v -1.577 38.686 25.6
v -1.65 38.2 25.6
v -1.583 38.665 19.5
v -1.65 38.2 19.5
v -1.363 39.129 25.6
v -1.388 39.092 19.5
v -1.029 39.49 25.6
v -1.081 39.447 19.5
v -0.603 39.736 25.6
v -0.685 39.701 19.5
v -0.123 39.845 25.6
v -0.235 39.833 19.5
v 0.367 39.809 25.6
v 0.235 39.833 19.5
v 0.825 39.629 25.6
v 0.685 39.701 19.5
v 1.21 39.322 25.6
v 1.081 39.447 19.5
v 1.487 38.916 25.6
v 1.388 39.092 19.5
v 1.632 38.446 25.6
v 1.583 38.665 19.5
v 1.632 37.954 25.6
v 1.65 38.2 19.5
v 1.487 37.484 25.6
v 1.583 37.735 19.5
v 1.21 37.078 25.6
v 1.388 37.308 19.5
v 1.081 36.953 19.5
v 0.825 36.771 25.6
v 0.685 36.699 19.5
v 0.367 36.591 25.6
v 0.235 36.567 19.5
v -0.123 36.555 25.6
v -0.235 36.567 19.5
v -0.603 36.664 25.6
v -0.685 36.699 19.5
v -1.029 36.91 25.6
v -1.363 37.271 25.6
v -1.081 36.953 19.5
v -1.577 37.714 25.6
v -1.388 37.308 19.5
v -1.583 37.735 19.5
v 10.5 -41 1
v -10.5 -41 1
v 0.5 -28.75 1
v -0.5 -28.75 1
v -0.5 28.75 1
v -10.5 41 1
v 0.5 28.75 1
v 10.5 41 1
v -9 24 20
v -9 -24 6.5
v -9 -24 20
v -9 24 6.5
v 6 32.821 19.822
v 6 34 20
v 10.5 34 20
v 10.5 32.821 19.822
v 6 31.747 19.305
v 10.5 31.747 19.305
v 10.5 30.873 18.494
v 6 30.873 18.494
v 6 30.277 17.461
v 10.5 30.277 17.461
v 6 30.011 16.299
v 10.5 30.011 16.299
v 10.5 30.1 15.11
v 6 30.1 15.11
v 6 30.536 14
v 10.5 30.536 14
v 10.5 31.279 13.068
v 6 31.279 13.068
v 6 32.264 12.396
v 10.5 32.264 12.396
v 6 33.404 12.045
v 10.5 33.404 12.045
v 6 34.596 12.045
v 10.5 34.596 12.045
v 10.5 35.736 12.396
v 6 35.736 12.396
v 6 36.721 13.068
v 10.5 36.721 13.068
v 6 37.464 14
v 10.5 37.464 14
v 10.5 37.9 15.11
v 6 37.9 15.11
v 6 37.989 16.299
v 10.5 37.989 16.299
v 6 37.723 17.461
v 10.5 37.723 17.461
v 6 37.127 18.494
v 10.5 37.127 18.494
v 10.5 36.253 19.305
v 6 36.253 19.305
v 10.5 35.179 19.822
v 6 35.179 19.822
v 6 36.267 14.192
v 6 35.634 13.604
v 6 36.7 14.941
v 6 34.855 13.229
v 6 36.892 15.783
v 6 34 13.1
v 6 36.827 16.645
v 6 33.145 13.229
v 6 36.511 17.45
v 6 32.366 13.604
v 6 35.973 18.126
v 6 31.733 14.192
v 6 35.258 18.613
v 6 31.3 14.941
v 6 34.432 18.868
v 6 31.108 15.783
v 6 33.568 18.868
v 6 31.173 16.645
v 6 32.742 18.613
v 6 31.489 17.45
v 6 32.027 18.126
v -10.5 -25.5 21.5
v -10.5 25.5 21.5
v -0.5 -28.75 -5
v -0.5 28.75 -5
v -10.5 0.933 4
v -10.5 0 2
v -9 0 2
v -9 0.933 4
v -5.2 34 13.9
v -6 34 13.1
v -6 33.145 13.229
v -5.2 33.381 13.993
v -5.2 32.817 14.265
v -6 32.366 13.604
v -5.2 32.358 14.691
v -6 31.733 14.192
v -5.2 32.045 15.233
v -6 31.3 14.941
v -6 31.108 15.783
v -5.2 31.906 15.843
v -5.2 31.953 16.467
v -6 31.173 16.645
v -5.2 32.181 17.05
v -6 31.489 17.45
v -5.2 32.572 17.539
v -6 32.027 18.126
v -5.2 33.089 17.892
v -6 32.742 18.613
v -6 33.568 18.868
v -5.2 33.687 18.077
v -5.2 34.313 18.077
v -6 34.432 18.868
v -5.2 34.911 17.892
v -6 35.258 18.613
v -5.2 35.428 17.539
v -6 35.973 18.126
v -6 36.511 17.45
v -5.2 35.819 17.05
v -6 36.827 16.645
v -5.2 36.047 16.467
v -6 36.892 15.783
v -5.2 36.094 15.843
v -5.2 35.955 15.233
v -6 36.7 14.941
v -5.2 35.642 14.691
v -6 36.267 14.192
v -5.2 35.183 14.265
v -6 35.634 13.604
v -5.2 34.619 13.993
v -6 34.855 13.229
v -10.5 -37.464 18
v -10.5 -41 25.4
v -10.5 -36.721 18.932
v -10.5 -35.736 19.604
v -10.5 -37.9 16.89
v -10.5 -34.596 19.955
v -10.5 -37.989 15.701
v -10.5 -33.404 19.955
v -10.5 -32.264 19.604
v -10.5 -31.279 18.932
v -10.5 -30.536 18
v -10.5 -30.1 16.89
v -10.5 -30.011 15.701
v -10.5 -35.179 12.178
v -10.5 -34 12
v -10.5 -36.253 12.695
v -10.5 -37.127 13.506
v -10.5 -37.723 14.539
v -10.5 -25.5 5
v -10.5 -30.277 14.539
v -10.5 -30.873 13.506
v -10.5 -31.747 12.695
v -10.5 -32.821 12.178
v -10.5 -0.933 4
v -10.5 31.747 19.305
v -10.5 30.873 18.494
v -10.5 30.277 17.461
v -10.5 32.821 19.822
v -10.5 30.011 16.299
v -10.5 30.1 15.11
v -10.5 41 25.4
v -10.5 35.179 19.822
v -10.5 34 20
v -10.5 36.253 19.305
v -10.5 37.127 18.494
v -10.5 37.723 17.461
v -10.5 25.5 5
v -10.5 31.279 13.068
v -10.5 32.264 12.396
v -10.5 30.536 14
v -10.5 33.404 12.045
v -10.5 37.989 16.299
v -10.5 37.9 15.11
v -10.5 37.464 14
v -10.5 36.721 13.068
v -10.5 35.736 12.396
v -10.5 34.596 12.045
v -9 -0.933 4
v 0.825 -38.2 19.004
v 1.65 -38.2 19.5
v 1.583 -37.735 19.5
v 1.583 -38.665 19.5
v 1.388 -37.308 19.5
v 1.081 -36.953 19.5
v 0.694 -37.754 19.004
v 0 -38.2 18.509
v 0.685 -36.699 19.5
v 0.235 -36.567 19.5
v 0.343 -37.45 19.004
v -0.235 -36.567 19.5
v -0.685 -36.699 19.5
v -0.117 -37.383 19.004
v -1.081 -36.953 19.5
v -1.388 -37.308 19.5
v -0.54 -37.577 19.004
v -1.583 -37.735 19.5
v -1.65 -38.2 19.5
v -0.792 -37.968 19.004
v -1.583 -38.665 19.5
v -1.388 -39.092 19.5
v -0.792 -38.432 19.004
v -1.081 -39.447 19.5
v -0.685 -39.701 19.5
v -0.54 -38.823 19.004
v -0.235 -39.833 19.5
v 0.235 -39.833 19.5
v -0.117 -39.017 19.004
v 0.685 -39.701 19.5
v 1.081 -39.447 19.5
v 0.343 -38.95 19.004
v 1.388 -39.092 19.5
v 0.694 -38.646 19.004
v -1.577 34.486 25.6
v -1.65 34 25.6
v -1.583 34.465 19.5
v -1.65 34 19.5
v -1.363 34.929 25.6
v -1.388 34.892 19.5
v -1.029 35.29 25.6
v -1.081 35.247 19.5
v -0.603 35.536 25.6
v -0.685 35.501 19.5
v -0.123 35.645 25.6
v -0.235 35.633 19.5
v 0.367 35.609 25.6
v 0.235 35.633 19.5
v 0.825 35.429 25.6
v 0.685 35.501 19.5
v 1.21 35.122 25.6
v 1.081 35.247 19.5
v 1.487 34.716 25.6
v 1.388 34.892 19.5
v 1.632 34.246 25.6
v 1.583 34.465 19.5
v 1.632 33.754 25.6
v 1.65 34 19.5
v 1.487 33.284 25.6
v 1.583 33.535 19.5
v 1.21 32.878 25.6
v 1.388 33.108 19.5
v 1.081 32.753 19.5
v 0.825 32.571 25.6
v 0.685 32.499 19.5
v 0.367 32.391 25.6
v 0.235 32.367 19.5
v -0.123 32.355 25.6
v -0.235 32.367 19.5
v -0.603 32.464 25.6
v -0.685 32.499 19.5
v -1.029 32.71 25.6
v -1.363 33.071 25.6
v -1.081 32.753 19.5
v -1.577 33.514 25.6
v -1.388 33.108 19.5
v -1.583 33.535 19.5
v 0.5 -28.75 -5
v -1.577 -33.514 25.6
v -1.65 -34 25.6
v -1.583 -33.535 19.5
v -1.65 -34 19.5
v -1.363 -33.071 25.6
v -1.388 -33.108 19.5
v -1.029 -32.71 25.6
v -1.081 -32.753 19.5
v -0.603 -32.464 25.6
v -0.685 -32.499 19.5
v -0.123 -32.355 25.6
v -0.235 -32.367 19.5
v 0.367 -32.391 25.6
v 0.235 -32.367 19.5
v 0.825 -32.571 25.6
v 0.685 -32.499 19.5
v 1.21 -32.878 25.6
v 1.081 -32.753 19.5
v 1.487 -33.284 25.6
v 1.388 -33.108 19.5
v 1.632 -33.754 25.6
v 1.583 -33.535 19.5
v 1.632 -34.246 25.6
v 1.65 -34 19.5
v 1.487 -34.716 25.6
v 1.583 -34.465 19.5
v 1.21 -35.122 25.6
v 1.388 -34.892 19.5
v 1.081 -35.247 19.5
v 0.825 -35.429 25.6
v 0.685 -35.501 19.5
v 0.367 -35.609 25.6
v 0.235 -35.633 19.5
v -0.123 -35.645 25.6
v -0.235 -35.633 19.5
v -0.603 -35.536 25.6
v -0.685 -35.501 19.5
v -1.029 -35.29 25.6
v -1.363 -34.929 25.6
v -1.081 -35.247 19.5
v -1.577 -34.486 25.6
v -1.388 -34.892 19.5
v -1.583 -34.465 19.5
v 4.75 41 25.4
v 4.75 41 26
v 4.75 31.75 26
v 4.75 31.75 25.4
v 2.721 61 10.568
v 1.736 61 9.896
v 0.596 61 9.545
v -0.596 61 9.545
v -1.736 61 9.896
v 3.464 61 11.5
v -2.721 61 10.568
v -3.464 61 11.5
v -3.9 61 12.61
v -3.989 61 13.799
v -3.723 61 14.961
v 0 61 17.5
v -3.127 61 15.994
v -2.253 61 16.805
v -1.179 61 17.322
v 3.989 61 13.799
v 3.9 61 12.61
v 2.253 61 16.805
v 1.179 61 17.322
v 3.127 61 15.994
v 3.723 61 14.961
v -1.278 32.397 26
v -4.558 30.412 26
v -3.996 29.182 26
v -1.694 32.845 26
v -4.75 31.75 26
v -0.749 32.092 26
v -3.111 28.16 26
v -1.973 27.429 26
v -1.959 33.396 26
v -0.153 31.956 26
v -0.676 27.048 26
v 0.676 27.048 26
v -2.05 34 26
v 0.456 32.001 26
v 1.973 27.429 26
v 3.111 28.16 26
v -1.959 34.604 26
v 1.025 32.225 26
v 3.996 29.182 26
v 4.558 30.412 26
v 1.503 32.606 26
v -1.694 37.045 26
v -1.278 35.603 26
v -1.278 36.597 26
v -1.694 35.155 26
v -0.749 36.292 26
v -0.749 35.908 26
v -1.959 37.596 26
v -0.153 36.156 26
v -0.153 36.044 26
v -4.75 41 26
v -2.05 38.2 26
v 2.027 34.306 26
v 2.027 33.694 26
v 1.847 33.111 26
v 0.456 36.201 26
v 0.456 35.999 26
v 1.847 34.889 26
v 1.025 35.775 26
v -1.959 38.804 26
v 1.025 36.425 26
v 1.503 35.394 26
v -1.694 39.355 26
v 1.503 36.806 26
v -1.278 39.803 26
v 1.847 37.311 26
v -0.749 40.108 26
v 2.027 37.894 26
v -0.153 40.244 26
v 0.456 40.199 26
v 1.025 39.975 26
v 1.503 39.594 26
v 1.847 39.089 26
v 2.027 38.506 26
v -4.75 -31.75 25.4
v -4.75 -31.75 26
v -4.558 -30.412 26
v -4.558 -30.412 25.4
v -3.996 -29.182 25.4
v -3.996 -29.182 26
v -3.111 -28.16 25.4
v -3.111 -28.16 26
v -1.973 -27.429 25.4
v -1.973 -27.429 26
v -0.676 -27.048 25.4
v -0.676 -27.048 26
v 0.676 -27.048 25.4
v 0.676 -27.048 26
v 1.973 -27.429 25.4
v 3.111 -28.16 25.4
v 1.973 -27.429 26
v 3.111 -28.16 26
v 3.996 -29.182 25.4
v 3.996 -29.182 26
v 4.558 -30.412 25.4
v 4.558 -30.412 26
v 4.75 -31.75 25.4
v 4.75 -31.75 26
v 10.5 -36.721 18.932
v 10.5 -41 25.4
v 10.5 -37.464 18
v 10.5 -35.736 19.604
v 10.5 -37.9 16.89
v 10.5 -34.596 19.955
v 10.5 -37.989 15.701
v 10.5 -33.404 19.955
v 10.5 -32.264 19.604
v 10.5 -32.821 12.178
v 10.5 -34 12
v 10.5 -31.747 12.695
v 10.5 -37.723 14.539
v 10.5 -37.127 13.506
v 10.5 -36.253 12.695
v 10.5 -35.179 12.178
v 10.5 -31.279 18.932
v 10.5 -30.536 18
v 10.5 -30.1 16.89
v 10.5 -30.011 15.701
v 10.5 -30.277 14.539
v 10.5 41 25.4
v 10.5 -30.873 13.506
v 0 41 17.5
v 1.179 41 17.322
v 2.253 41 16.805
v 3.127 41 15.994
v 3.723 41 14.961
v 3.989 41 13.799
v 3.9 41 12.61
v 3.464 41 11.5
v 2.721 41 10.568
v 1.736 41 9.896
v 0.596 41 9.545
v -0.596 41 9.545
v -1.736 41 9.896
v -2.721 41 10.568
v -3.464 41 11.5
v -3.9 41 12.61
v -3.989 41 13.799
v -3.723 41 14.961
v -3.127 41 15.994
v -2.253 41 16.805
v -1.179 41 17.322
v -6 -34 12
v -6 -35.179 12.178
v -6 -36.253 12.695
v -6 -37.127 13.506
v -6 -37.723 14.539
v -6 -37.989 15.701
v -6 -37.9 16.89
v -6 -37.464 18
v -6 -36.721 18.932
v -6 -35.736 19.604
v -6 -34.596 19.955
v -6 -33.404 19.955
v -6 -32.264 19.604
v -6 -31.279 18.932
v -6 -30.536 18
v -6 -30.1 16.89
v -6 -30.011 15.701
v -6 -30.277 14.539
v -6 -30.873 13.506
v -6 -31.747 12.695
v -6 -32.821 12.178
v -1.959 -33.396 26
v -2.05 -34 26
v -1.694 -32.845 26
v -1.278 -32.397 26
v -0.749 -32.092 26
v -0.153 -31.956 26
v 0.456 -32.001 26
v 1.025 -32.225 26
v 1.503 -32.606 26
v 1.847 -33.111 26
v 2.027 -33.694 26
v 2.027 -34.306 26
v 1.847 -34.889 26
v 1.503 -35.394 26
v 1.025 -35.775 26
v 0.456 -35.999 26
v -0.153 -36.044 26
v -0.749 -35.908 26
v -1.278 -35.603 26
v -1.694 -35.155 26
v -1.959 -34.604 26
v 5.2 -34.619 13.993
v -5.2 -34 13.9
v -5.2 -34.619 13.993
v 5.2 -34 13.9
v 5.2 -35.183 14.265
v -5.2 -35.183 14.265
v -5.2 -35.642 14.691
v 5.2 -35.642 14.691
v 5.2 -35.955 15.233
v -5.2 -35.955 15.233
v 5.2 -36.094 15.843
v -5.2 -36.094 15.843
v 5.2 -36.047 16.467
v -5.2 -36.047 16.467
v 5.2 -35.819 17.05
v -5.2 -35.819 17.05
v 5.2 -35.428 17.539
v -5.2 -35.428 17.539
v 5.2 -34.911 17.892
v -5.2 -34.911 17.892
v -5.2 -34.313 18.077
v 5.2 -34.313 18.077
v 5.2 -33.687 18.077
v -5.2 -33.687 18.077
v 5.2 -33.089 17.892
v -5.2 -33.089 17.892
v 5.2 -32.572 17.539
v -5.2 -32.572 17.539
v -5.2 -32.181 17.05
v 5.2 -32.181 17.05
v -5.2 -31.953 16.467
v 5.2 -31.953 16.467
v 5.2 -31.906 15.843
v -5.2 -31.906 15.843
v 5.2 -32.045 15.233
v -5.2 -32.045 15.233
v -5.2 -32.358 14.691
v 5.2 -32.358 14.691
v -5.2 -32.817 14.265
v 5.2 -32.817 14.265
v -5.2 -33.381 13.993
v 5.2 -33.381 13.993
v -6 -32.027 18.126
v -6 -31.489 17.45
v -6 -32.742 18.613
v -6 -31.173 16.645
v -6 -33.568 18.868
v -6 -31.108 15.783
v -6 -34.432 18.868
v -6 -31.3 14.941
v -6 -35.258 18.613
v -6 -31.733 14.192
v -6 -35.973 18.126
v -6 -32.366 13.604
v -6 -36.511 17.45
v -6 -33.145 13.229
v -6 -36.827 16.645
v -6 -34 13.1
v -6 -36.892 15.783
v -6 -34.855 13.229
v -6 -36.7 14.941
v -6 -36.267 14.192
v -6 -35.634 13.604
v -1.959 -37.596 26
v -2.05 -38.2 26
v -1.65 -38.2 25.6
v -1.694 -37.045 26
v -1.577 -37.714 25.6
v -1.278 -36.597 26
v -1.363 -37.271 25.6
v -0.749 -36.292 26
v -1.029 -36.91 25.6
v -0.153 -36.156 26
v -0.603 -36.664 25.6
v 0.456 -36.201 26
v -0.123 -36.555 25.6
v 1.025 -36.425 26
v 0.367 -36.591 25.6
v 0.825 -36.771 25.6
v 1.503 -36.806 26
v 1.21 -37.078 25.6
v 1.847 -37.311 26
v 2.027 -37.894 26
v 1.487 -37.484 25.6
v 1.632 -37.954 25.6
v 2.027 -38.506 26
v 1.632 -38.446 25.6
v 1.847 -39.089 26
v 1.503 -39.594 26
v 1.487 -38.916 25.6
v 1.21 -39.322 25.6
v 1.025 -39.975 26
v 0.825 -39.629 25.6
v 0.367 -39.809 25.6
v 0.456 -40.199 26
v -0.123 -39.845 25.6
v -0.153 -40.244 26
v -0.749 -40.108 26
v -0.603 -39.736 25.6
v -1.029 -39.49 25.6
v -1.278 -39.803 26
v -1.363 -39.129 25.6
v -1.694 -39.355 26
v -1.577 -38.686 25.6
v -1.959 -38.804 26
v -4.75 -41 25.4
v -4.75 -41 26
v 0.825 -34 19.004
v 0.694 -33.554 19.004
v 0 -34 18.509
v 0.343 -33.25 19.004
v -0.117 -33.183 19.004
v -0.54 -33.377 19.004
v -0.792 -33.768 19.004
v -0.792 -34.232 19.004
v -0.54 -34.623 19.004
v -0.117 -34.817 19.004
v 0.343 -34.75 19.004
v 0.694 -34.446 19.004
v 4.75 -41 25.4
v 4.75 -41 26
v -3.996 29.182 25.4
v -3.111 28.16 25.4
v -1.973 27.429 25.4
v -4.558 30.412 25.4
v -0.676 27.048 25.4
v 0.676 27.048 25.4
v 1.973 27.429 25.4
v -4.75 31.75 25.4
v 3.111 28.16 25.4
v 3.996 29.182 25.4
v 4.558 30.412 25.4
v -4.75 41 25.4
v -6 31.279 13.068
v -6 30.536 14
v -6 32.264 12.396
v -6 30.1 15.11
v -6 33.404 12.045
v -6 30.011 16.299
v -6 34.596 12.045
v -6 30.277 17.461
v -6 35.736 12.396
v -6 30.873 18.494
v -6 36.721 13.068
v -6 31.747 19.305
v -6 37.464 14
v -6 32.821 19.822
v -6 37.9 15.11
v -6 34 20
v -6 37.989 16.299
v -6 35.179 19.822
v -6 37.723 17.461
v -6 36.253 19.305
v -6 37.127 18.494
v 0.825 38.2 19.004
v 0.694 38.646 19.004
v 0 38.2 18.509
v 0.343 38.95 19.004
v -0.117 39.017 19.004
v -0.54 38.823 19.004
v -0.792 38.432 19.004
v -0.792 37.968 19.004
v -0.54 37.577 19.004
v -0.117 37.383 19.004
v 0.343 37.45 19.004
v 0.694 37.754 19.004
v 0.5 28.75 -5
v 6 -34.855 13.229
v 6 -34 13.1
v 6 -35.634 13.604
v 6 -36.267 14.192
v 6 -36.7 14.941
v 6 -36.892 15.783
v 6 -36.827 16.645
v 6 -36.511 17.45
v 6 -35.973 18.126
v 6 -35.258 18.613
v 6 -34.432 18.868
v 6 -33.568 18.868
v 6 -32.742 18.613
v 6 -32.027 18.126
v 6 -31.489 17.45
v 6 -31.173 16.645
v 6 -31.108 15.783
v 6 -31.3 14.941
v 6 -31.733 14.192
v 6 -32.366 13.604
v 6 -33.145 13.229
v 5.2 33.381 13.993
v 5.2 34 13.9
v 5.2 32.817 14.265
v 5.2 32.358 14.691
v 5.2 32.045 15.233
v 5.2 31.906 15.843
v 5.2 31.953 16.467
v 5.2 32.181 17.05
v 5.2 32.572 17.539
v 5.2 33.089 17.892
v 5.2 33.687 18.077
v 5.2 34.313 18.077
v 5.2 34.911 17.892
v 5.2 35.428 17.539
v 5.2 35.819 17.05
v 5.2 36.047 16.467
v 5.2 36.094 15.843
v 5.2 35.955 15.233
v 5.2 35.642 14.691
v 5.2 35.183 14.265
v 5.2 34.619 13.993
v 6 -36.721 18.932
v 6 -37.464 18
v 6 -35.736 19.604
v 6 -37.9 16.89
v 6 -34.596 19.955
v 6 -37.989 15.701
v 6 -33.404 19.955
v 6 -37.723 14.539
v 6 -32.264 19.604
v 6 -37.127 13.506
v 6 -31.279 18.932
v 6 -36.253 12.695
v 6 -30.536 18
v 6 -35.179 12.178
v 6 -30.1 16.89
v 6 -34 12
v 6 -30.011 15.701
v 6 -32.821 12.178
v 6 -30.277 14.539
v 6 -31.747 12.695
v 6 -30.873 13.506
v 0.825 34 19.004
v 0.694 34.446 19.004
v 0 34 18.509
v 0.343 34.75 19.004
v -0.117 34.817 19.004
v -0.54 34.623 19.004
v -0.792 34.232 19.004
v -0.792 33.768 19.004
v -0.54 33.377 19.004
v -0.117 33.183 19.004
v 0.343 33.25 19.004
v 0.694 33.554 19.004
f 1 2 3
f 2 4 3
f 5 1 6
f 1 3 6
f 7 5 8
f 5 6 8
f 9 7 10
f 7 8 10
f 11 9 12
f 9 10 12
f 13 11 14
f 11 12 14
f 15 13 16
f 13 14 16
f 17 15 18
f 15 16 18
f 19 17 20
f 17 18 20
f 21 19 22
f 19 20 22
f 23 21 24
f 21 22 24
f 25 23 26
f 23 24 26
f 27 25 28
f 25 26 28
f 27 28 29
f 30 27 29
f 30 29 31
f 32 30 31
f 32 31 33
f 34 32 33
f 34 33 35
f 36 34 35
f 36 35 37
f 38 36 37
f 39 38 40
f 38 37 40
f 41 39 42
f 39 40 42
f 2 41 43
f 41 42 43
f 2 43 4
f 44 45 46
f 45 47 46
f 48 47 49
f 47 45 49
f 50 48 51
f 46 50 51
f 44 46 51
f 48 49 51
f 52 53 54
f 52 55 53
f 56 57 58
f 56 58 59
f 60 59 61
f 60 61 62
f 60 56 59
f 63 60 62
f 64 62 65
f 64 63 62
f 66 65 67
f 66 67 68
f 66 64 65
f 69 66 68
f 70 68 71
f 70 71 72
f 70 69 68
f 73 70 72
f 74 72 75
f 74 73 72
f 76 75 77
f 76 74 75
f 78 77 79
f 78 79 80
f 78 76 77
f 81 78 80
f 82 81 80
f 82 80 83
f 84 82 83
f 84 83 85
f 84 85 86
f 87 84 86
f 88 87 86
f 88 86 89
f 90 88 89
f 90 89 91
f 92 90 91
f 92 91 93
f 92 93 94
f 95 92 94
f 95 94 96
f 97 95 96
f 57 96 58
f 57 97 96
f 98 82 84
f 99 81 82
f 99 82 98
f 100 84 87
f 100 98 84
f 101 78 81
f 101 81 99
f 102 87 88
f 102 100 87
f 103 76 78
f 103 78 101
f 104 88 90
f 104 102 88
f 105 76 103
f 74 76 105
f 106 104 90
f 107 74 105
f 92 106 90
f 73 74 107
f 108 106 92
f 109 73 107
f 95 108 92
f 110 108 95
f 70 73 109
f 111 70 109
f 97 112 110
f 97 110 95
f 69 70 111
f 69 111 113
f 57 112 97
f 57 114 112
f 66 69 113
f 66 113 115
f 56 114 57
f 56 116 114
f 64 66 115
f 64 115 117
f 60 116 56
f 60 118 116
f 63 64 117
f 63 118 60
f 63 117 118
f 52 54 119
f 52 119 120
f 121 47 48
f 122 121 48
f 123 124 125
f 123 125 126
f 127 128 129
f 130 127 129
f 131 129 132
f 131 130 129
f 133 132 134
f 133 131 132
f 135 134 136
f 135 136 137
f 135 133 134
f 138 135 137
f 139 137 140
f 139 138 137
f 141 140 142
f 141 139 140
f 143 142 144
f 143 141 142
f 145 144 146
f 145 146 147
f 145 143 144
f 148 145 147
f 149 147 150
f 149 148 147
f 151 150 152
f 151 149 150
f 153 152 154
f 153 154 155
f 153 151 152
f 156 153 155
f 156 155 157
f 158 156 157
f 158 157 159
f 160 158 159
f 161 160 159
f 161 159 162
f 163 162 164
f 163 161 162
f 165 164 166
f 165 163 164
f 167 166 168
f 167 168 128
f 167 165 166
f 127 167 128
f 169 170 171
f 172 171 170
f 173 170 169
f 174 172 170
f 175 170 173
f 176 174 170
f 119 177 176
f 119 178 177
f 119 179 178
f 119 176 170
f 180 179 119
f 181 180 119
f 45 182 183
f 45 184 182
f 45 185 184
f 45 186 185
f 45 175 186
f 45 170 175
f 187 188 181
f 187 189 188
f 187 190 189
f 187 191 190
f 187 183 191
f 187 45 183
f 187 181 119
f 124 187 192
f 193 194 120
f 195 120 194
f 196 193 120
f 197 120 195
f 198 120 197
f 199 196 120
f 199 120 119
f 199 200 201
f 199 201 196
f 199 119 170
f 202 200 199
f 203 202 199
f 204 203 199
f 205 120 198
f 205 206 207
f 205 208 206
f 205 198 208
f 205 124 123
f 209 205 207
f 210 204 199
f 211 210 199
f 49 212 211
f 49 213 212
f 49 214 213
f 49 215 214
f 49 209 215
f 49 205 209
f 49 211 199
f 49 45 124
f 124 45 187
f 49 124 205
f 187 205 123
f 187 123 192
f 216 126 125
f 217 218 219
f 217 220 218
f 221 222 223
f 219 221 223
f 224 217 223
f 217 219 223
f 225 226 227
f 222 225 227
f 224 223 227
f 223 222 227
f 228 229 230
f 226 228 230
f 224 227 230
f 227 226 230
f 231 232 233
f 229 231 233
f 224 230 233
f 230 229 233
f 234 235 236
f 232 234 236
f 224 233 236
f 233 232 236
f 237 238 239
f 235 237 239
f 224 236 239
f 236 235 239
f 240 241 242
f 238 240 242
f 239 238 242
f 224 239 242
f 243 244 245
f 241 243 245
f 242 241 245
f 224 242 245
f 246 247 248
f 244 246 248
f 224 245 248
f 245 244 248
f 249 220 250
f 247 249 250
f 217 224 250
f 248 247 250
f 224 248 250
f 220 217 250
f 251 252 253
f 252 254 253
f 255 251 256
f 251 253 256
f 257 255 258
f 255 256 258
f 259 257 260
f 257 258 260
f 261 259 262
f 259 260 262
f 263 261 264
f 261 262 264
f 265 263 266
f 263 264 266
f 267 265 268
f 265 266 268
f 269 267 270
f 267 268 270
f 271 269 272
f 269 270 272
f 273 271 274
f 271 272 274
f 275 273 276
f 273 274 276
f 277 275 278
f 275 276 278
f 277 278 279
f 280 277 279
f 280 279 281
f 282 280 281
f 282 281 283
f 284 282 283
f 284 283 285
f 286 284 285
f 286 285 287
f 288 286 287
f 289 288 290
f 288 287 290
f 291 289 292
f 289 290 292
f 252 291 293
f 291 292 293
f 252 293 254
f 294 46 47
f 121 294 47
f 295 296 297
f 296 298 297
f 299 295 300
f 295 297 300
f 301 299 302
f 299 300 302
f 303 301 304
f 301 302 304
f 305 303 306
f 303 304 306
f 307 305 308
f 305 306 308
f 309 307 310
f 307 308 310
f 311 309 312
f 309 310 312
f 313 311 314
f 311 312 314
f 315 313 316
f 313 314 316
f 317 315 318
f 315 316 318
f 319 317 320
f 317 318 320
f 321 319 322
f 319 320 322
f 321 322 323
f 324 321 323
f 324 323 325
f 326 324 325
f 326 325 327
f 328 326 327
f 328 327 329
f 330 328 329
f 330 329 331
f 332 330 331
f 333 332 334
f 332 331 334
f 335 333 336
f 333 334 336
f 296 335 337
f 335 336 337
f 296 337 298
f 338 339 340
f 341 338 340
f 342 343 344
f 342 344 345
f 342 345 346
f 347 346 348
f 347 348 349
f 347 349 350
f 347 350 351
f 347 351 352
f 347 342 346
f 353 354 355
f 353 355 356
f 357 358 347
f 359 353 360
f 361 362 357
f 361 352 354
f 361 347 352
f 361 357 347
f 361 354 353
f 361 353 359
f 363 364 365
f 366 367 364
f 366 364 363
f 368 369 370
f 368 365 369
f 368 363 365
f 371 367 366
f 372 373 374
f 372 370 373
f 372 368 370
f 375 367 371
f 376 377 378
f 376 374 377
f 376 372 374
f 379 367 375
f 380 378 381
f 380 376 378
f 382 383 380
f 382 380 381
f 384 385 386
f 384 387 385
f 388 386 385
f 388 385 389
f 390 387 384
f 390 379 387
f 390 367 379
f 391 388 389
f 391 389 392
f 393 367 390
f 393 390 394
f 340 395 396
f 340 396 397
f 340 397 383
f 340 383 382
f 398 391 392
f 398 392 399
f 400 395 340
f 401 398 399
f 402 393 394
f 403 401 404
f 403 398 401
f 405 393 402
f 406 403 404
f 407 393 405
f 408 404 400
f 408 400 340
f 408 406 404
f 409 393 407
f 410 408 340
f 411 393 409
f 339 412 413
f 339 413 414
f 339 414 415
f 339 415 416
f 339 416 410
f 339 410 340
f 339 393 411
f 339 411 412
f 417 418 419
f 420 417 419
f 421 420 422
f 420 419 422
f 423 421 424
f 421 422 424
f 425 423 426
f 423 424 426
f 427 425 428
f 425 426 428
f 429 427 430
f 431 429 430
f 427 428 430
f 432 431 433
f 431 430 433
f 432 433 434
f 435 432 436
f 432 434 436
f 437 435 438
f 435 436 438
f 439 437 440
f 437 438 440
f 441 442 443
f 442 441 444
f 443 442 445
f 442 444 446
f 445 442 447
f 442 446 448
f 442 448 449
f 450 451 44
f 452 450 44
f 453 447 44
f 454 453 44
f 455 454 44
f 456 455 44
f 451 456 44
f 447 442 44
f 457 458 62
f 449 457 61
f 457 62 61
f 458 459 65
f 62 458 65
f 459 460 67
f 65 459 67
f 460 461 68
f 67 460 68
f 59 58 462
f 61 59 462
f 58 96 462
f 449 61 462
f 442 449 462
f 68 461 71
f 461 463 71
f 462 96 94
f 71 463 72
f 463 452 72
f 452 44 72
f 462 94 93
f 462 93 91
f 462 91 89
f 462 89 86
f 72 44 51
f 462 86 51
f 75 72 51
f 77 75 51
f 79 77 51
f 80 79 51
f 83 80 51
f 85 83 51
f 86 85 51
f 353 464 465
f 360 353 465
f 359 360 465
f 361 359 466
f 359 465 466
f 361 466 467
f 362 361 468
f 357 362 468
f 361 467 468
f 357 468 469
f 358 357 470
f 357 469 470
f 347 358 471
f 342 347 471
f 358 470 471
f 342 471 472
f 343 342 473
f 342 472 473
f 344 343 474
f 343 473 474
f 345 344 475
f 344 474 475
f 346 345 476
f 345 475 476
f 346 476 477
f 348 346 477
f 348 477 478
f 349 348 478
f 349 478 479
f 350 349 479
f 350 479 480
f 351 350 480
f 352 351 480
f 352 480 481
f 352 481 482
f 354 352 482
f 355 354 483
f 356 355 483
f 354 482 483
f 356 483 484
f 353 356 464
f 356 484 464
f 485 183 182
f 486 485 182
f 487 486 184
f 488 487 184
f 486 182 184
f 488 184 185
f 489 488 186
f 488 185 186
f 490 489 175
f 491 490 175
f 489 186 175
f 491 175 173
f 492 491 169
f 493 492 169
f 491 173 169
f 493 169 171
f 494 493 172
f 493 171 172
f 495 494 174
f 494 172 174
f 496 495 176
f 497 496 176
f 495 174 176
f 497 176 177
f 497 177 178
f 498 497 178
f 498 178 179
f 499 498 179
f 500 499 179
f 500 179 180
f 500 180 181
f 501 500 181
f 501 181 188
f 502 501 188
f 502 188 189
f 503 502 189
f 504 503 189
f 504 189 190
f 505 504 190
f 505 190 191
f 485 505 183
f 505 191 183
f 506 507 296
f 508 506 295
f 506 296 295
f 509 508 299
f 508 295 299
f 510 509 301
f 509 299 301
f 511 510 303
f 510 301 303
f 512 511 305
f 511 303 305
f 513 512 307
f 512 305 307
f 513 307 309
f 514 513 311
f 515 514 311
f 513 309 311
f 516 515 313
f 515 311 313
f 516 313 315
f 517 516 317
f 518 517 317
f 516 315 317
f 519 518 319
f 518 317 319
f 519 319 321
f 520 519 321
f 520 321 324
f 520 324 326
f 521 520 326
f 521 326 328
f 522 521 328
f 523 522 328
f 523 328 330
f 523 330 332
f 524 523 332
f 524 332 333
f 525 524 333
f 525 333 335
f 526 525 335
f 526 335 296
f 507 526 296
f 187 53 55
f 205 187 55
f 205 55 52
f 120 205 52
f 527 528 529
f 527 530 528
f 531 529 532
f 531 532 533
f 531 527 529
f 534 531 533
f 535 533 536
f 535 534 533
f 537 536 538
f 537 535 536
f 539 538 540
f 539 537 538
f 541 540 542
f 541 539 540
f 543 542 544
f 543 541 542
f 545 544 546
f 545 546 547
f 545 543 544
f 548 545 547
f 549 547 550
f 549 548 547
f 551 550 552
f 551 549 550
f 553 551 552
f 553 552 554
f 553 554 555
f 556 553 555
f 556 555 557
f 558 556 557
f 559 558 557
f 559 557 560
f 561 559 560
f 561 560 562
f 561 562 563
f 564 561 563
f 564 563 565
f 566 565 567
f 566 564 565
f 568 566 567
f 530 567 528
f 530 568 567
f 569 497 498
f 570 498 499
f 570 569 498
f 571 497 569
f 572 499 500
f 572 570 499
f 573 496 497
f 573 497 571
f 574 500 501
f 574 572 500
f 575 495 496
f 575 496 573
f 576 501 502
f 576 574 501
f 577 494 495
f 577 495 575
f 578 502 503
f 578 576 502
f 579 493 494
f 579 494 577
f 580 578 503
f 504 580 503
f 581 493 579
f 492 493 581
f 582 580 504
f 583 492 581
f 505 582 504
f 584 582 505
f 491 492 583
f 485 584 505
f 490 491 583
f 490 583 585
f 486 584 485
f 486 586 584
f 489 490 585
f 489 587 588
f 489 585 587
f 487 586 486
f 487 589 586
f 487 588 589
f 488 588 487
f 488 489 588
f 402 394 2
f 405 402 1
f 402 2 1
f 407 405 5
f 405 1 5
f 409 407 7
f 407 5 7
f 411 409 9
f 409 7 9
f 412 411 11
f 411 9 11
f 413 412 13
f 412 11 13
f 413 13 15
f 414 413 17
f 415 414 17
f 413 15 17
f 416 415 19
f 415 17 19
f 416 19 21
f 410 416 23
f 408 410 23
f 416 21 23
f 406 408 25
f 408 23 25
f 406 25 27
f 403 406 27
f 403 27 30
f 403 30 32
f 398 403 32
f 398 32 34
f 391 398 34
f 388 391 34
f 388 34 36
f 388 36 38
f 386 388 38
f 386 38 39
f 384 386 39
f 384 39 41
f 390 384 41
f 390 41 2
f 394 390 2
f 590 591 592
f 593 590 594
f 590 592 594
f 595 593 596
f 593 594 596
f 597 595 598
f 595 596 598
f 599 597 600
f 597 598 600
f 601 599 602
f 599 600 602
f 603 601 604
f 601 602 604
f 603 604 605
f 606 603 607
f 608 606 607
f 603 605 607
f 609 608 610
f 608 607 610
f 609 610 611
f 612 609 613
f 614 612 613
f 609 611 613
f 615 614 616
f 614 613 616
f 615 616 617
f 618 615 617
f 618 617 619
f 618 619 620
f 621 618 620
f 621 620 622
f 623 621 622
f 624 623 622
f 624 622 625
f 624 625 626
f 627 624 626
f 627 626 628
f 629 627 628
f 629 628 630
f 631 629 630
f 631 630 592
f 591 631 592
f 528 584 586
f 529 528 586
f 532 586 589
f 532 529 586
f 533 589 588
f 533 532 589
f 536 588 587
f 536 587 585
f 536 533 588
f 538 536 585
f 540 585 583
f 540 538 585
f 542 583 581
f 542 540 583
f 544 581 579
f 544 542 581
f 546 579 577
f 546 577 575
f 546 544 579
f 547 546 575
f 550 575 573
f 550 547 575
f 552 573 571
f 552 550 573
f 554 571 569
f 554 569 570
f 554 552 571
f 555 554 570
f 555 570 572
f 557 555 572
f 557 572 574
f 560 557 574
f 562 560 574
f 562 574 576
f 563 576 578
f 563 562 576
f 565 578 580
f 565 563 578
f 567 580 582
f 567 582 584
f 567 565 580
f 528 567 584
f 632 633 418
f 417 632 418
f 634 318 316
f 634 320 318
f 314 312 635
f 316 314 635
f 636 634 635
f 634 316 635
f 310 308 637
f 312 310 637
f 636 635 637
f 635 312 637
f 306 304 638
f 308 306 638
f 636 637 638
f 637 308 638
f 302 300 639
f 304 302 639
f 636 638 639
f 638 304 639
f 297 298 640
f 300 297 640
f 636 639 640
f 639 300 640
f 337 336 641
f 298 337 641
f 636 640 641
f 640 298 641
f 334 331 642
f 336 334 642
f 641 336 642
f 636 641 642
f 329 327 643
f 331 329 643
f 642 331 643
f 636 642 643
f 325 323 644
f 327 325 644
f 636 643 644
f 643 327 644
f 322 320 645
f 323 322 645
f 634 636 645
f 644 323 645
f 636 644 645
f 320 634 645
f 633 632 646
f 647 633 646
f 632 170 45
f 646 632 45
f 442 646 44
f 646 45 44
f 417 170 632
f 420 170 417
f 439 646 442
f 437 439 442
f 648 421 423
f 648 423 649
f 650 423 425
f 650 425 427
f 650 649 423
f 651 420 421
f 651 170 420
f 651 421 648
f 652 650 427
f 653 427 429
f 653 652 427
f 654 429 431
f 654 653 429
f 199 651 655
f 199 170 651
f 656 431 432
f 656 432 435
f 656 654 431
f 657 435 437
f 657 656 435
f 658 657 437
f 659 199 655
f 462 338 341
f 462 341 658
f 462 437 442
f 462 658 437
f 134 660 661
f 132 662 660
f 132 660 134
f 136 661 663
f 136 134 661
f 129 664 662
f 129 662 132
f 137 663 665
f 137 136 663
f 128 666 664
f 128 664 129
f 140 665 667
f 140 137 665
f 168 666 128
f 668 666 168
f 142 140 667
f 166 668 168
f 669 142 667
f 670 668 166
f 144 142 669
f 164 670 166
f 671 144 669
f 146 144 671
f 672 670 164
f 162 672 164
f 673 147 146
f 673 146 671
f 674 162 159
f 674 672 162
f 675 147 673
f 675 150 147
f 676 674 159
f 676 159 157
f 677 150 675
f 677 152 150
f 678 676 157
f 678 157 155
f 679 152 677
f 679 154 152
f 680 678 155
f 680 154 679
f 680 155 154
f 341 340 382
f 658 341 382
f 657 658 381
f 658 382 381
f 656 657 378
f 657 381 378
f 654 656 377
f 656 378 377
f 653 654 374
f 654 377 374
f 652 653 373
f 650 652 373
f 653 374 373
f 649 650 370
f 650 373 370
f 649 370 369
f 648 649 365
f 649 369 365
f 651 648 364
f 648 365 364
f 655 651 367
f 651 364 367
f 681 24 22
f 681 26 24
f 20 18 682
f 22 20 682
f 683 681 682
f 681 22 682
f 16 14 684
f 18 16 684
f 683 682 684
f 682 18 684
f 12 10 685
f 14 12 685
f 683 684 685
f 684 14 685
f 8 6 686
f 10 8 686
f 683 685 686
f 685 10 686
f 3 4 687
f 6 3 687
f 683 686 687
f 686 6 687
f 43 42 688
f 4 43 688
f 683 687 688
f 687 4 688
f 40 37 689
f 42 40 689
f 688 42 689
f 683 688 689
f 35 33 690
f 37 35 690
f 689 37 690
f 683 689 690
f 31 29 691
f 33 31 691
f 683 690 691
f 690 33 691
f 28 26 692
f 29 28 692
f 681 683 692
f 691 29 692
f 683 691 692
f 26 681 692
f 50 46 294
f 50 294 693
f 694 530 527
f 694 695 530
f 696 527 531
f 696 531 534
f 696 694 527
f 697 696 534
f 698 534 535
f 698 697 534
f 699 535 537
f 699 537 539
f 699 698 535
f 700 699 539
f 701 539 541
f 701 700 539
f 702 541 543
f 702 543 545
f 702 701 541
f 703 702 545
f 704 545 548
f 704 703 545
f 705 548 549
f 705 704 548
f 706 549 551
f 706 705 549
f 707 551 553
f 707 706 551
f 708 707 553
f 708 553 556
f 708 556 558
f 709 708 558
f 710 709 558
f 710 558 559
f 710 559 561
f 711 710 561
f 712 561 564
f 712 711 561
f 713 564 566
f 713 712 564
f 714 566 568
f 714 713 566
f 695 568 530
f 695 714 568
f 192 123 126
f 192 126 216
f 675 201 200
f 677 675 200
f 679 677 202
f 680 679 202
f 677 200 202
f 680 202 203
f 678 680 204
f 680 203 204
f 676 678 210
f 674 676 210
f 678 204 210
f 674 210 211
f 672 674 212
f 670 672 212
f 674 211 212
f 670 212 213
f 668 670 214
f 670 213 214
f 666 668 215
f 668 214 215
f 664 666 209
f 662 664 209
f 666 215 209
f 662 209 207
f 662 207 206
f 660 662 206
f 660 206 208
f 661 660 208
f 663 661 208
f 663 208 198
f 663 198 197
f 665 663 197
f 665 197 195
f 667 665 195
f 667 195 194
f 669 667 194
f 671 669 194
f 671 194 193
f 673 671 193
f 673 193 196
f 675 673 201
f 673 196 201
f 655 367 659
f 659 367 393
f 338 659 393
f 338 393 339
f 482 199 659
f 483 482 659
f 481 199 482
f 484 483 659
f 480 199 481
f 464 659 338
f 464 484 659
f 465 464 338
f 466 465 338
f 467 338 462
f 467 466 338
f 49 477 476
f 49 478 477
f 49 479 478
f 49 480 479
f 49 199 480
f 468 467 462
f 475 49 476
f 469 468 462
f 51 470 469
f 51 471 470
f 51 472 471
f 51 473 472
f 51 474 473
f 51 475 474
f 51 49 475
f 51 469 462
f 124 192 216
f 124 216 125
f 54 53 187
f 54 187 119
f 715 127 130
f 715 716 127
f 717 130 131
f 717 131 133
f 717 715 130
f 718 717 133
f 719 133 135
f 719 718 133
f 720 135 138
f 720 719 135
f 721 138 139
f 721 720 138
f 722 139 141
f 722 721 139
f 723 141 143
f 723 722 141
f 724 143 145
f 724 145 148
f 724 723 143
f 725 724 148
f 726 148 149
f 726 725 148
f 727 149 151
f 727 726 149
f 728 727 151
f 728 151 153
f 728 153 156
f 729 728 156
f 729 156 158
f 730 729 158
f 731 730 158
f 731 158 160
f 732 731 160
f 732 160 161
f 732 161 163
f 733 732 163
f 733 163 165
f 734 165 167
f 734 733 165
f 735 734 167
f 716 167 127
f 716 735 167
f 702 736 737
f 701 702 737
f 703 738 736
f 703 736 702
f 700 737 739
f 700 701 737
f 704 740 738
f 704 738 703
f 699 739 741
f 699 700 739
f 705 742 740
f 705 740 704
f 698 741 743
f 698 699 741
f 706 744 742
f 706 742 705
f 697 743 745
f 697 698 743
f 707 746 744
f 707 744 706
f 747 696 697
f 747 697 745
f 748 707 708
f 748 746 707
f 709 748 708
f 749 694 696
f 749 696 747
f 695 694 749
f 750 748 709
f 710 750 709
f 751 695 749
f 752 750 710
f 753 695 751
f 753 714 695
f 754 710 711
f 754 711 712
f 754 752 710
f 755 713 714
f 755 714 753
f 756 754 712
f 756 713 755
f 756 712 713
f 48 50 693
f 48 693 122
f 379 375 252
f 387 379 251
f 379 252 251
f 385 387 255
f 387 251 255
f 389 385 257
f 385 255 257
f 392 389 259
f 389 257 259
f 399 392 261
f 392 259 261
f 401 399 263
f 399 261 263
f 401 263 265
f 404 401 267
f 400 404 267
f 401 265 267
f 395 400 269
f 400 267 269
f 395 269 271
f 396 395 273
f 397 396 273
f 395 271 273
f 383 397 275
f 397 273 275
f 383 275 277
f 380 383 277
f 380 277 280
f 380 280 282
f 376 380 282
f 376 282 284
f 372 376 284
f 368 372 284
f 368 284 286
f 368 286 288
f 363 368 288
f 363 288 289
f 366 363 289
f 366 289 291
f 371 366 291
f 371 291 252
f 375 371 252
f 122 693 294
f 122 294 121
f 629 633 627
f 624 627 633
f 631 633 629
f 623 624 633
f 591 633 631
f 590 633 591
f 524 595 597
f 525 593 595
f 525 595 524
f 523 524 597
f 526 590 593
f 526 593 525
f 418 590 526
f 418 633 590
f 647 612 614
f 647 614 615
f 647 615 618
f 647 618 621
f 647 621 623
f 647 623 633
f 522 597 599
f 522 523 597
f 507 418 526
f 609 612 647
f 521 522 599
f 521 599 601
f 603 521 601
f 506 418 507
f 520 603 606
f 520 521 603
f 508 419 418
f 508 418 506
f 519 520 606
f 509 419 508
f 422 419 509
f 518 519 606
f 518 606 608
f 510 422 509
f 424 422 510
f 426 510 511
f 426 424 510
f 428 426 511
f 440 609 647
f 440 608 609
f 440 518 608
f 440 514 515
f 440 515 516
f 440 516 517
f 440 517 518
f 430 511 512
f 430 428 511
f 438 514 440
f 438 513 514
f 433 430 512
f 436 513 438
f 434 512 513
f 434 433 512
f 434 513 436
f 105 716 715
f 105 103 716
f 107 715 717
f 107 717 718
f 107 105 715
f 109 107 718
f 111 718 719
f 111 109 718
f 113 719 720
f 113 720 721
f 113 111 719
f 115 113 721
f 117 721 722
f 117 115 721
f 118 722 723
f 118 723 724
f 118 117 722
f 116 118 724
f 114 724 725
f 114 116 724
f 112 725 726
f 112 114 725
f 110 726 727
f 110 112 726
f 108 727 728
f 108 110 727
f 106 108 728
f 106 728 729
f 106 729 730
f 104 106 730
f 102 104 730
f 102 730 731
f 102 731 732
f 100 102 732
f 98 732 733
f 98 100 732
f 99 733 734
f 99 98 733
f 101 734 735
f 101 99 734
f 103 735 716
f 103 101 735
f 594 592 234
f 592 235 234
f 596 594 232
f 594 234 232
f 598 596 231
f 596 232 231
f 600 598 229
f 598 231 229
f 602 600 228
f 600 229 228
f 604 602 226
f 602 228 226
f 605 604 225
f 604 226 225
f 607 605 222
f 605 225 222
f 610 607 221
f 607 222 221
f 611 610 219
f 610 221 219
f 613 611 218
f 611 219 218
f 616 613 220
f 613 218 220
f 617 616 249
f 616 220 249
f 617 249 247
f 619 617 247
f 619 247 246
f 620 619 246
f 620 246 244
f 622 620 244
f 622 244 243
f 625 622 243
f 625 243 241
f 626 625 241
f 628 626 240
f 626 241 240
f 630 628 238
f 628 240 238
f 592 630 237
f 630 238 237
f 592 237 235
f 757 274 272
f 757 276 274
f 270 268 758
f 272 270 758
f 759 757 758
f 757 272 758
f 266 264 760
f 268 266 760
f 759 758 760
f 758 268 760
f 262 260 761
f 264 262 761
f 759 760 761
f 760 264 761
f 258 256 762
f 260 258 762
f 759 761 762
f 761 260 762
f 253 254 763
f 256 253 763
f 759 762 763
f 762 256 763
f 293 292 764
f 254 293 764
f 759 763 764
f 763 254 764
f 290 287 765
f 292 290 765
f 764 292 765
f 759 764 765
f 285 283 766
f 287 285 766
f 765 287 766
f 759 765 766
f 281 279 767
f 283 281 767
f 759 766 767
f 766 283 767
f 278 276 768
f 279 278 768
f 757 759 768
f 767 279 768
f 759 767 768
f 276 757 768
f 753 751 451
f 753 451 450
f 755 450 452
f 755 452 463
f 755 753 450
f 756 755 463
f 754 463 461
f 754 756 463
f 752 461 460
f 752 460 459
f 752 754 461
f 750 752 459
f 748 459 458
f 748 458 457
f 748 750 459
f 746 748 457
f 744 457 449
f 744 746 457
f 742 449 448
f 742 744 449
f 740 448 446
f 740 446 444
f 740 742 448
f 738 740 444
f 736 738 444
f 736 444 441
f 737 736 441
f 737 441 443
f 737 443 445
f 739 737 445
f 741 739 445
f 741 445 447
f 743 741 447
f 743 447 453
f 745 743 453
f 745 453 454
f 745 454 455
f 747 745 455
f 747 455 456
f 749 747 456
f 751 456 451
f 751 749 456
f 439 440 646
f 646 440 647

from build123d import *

# Parameters (mm, degrees)
SKETCH_2_W                  = 1
SKETCH_2_H                  = 57.5
EXTRUDE_2_DEPTH             = 8
EXTRUDE_3_DEPTH             = 23
EXTRUDE_3_DEPTH_BACK        = 2
SKETCH_3_W                  = 21
SKETCH_3_H                  = 82
SKETCH_4_R                  = 4
EXTRUDE_4_DEPTH             = 20
SKETCH_5_R                  = 4
CUT_EXTRUDE_1_DEPTH         = 4.5
CUT_EXTRUDE_START           = -4.5
SKETCH_6_R                  = 4
CUT_EXTRUDE_2_DEPTH         = 4.5
HOLE_WIZARD_M51_AT_2_COUNT  = 2
HOLE_WIZARD_M51_AT_2_PITCH  = 68
CUT_EXTRUDE_3_DEPTH         = 0.6
HOLE_WIZARD_M41_D           = 3.3
HOLE_WIZARD_M41_DEPTH       = 6.5
HOLE_WIZARD_M41_CSINK_D     = 4.1
HOLE_WIZARD_M41_CSINK_ANGLE = 90
HOLE_WIZARD_M41_TIP         = 0.991420021
SKETCH_12_W                 = 16.5
SKETCH_12_H                 = 51
CUT_EXTRUDE_4_DEPTH         = 1.5
CHAMFER_1_SIZE              = 1.5


with BuildPart() as part:
    # Эскиз2 → Бобышка-Вытянуть2 (new body)
    with BuildSketch(Plane(origin=(0, 0, 3), x_dir=(-1, 0, 0), z_dir=(0, 0, -1))):
        Rectangle(SKETCH_2_W, SKETCH_2_H)
    extrude(amount=EXTRUDE_2_DEPTH)

    # Эскиз3 → Бобышка-Вытянуть3 (add, two sides: drawn at the far end of the back side and taken through both)
    with BuildSketch(Plane.XY.offset(3).offset(-EXTRUDE_3_DEPTH_BACK)):
        Rectangle(SKETCH_3_W, SKETCH_3_H)
    extrude(amount=EXTRUDE_3_DEPTH + EXTRUDE_3_DEPTH_BACK)

    # Эскиз4 → Бобышка-Вытянуть4 (add)
    with BuildSketch(Plane(origin=(0, 41, 0), x_dir=(1, 0, 0), z_dir=(0, 1, 0))):
        with Locations(Location((0, -13.5, 0), (0, 0, 270))):
            Circle(SKETCH_4_R)
    extrude(amount=EXTRUDE_4_DEPTH)

    # Эскиз5 → Вырез-Вытянуть1 (cut)
    with BuildSketch(Plane.ZY.offset(10.5)):
        with Locations((16, 34)):
            Circle(SKETCH_5_R)
        with Locations(Location((16, -34, 0), (0, 0, 180))):
            Circle(SKETCH_5_R)
    extrude(amount=-CUT_EXTRUDE_1_DEPTH, mode=Mode.SUBTRACT)

    # Эскиз6 → Вырез-Вытянуть2 (cut)
    with BuildSketch(Plane(origin=(10.5, 0, 0), x_dir=(0, 0, -1), z_dir=(1, 0, 0)).offset(CUT_EXTRUDE_START)):
        with Locations(Location((-16, 34, 0), (0, 0, 180))):
            Circle(SKETCH_6_R)
        with Locations((-16, -34)):
            Circle(SKETCH_6_R)
    extrude(amount=CUT_EXTRUDE_2_DEPTH, mode=Mode.SUBTRACT)

    # Эскиз8 → Отверстие обработанное метчиком M51 (revolve, cut)
    with BuildSketch(Plane(origin=(6, 34, 16), x_dir=(0, 0, -1), z_dir=(0, 1, 0))):
        Polygon((0, 0), (0, 12), (2.9, 12), (2.1, 11.2), (2.1, 0.8), (2.9, 0), align=None)
    hole_wizard_m51 = revolve(axis=Axis((12.35, 34, 16), (-1, 0, 0)), mode=Mode.SUBTRACT)

    # Отверстие обработанное метчиком M51 at 2: Отверстие обработанное метчиком M51 ×2
    with Locations(*[(0, -i * HOLE_WIZARD_M51_AT_2_PITCH, 0) for i in range(1, HOLE_WIZARD_M51_AT_2_COUNT)]):
        add(hole_wizard_m51, mode=Mode.SUBTRACT)

    # Эскиз9 → Вырез-Вытянуть3 (cut)
    with BuildSketch(Plane.XY.offset(26)):
        with BuildLine():
            Line((-4.75, 31.75), (-4.75, 41))
            Line((-4.75, 41), (-10.5, 41))
            Line((-10.5, 41), (-10.5, -41))
            Line((-10.5, -41), (-4.75, -41))
            Line((-4.75, -41), (-4.75, -31.75))
            ThreePointArc((-4.75, -31.75), (0, -27), (4.75, -31.75))
            Line((4.75, -31.75), (4.75, -41))
            Line((4.75, -41), (10.5, -41))
            Line((10.5, -41), (10.5, 41))
            Line((10.5, 41), (4.75, 41))
            Line((4.75, 41), (4.75, 31.75))
            ThreePointArc((4.75, 31.75), (0, 27), (-4.75, 31.75))
        make_face()
    extrude(amount=-CUT_EXTRUDE_3_DEPTH, mode=Mode.SUBTRACT)

    # Отверстие обработанное метчиком M41
    with Locations(Plane.XY.offset(26)):
        with Locations((0, 38.2), (0, 34), (0, -34), (0, -38.2)):
            CounterSinkHole(HOLE_WIZARD_M41_D / 2, HOLE_WIZARD_M41_CSINK_D / 2, depth=HOLE_WIZARD_M41_DEPTH, counter_sink_angle=HOLE_WIZARD_M41_CSINK_ANGLE)
            with Locations((0, 0, -(HOLE_WIZARD_M41_DEPTH + HOLE_WIZARD_M41_TIP / 2))):  # 118° drill point
                Cone(0, HOLE_WIZARD_M41_D / 2, HOLE_WIZARD_M41_TIP, mode=Mode.SUBTRACT)

    # Эскиз12 → Вырез-Вытянуть4 (cut)
    with BuildSketch(Plane.ZY.offset(10.5)):
        Polygon((2, 0), (4, 0.932615316), (4, -0.932615316), align=None)
        with Locations((13.25, 0)):
            Rectangle(SKETCH_12_W, SKETCH_12_H)
    extrude(amount=-CUT_EXTRUDE_4_DEPTH, mode=Mode.SUBTRACT)

    # Фаска1
    chamfer_1_edges = [part.edges().sort_by_distance(p)[0] for p in [
        (-9, -25.5, 13.25),
        (-9, 0, 5),
        (-9, 25.5, 13.25),
        (-9, 0, 21.5),
    ]]
    chamfer(chamfer_1_edges, length=CHAMFER_1_SIZE - 0.0001)  # a hair under: the kernel refuses the full size


solid = part.part
